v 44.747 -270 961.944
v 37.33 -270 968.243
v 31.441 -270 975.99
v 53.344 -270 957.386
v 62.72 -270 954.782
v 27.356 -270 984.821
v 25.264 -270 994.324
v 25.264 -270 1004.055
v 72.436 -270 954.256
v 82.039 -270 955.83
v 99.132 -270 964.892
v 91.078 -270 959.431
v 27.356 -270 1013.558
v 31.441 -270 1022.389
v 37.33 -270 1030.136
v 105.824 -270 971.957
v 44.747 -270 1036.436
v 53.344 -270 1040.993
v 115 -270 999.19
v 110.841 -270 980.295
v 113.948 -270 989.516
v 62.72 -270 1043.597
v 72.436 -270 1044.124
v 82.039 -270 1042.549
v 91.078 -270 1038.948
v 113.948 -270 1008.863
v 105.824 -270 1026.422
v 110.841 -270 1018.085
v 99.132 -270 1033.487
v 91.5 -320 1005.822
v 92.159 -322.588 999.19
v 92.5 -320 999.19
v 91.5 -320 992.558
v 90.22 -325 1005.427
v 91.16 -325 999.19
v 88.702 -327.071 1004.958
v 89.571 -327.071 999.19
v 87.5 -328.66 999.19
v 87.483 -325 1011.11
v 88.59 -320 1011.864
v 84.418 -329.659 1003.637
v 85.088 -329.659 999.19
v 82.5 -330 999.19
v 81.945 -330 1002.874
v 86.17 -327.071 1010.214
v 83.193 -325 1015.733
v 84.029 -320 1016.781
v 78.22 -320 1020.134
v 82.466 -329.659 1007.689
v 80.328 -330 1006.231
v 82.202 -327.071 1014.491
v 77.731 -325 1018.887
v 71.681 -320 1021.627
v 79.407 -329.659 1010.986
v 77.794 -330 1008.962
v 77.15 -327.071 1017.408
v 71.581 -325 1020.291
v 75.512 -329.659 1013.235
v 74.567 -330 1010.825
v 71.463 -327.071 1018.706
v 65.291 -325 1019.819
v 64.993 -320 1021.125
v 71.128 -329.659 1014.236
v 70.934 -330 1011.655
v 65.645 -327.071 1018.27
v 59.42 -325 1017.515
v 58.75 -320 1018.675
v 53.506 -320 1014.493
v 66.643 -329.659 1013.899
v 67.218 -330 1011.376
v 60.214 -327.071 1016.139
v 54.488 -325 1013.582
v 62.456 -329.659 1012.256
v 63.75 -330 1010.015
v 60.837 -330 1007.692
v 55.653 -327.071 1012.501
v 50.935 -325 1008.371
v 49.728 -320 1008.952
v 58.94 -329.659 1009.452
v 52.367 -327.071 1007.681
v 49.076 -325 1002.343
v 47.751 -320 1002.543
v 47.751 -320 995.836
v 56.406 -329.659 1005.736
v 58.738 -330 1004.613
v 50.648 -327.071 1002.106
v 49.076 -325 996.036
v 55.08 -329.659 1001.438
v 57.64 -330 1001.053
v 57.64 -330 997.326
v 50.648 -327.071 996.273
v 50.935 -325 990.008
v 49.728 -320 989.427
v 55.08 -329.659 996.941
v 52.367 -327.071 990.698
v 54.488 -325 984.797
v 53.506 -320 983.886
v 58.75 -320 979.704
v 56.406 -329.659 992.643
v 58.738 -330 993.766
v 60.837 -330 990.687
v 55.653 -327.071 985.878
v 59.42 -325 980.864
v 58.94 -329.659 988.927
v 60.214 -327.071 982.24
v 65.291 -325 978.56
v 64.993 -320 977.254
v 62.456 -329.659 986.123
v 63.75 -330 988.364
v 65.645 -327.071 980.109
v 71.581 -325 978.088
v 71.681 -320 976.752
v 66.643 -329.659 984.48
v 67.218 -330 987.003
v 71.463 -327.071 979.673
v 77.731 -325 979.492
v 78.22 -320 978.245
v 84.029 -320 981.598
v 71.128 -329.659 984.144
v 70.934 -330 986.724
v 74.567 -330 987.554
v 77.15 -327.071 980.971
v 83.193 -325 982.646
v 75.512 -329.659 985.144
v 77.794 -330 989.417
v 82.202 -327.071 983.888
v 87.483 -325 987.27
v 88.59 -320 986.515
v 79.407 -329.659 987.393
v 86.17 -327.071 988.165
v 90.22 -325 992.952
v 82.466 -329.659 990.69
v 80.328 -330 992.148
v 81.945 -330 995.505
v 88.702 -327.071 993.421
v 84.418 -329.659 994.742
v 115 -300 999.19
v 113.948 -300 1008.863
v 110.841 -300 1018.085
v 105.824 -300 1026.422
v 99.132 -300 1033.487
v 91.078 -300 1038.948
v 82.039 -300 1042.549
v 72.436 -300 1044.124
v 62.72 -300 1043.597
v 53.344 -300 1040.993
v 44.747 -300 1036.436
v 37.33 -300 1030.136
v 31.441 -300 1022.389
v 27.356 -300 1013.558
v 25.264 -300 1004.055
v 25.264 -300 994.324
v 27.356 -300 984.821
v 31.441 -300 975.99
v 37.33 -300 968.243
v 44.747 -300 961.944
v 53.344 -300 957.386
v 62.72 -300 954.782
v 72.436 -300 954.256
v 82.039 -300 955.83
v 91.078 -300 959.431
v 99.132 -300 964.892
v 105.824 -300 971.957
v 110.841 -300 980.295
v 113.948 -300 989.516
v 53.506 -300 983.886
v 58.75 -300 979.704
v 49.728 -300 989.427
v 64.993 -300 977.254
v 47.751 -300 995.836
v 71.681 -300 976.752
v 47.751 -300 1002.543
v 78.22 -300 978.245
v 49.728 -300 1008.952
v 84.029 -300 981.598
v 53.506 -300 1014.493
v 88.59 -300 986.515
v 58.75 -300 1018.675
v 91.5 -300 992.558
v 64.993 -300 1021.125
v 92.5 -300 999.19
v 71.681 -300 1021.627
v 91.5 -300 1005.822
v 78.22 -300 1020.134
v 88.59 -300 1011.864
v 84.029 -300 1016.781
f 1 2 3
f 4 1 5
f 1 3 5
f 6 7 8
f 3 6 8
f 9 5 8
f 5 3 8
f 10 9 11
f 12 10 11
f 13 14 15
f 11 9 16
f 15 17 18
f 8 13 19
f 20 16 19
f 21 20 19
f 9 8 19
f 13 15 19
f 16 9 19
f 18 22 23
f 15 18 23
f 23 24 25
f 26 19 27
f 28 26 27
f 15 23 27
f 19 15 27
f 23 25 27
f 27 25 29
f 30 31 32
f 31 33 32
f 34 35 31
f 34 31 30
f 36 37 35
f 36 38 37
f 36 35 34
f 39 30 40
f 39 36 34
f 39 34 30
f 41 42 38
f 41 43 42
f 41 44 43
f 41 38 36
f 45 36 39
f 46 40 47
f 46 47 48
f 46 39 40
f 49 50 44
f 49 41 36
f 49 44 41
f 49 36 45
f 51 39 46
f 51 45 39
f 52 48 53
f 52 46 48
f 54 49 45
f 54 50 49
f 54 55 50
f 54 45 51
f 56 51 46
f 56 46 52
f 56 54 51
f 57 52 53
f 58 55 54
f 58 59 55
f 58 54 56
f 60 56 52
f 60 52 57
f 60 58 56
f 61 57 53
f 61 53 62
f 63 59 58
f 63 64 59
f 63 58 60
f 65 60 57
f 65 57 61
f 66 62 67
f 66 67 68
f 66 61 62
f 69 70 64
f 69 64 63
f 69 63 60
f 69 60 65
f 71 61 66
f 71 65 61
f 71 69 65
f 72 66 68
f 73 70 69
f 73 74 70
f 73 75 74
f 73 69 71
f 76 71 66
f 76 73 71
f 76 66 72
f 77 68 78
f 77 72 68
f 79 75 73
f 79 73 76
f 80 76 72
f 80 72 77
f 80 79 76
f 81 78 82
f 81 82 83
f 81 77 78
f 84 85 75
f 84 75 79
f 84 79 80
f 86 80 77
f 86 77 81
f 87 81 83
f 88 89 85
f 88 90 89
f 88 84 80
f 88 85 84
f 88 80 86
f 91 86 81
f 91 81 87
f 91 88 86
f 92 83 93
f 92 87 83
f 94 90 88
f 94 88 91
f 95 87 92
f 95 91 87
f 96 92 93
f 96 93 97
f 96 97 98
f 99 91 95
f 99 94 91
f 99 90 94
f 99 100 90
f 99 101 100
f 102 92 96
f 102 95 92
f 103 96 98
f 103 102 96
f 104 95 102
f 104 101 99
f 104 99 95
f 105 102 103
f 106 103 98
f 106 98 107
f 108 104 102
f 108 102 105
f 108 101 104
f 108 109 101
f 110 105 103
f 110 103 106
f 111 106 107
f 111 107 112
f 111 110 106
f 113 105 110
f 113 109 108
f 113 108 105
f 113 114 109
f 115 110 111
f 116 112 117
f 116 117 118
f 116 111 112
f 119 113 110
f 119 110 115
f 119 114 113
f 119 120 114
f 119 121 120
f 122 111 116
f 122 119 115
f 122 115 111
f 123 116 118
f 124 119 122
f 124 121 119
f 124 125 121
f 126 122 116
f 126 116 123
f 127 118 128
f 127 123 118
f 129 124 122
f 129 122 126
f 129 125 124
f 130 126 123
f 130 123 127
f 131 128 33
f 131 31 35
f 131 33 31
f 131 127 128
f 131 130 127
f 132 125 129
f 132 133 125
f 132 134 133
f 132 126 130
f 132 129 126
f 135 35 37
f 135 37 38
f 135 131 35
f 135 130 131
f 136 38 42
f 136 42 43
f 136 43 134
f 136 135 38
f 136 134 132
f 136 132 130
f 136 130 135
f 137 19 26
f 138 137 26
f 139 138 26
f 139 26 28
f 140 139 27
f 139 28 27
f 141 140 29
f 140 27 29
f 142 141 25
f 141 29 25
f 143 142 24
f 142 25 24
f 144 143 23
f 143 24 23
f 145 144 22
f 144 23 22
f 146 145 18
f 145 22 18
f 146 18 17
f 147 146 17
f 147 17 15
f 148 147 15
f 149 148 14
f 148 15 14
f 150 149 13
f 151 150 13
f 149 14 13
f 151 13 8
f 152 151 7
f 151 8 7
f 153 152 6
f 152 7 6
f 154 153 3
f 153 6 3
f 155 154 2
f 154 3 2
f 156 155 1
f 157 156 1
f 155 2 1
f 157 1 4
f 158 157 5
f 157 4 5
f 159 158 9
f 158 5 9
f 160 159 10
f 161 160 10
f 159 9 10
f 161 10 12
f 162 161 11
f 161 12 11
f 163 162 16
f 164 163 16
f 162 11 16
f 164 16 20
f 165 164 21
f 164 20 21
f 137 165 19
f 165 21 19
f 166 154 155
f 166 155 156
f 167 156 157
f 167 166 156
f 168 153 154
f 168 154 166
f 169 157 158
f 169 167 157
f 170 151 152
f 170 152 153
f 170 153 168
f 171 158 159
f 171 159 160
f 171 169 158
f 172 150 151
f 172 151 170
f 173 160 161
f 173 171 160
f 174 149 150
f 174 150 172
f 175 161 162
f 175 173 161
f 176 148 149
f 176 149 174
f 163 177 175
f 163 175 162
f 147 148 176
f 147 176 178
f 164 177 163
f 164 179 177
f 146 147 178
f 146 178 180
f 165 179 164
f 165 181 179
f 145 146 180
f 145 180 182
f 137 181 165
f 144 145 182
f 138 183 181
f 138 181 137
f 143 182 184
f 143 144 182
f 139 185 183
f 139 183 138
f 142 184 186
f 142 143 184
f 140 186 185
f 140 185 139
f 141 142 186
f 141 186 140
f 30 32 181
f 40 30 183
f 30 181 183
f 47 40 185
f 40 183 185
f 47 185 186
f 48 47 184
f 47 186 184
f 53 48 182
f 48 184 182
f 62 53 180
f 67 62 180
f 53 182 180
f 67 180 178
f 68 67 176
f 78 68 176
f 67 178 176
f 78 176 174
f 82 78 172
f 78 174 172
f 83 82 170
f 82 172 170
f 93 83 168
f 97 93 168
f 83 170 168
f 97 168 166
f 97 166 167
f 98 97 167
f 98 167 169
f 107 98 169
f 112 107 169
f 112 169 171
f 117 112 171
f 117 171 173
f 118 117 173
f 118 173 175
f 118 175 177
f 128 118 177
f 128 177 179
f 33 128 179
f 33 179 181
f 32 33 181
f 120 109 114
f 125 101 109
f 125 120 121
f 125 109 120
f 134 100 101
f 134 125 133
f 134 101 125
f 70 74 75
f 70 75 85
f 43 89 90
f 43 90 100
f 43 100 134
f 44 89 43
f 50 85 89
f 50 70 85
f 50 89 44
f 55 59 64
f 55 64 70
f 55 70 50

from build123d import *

# Parameters (mm, degrees)
SKETCH1_R           = 45
SKETCH1_R_2         = 22.5
BOSS_EXTRUDE1_DEPTH = 30
SKETCH2_R           = 22.5
BOSS_EXTRUDE2_DEPTH = 60
FILLET1_R           = 10


with BuildPart() as part:
    # Sketch1 → Boss-Extrude1 (new body)
    with BuildSketch(Plane.XZ.offset(270)):
        with Locations((70, 999.189515243)):
            Circle(SKETCH1_R)
        with Locations((70, 999.189515243)):
            Circle(SKETCH1_R_2, mode=Mode.SUBTRACT)
    extrude(amount=BOSS_EXTRUDE1_DEPTH)

    # Sketch2 → Boss-Extrude2 (add)
    with BuildSketch(Plane.XZ.offset(270)):
        with Locations((70, 999.189515243)):
            Circle(SKETCH2_R)
    extrude(amount=BOSS_EXTRUDE2_DEPTH)

    # Fillet1
    fillet1_edges = [part.edges().sort_by_distance(p)[0] for p in [
        (47.5, -330, 999.189515243),
    ]]
    fillet(fillet1_edges, radius=FILLET1_R)


solid = part.part
